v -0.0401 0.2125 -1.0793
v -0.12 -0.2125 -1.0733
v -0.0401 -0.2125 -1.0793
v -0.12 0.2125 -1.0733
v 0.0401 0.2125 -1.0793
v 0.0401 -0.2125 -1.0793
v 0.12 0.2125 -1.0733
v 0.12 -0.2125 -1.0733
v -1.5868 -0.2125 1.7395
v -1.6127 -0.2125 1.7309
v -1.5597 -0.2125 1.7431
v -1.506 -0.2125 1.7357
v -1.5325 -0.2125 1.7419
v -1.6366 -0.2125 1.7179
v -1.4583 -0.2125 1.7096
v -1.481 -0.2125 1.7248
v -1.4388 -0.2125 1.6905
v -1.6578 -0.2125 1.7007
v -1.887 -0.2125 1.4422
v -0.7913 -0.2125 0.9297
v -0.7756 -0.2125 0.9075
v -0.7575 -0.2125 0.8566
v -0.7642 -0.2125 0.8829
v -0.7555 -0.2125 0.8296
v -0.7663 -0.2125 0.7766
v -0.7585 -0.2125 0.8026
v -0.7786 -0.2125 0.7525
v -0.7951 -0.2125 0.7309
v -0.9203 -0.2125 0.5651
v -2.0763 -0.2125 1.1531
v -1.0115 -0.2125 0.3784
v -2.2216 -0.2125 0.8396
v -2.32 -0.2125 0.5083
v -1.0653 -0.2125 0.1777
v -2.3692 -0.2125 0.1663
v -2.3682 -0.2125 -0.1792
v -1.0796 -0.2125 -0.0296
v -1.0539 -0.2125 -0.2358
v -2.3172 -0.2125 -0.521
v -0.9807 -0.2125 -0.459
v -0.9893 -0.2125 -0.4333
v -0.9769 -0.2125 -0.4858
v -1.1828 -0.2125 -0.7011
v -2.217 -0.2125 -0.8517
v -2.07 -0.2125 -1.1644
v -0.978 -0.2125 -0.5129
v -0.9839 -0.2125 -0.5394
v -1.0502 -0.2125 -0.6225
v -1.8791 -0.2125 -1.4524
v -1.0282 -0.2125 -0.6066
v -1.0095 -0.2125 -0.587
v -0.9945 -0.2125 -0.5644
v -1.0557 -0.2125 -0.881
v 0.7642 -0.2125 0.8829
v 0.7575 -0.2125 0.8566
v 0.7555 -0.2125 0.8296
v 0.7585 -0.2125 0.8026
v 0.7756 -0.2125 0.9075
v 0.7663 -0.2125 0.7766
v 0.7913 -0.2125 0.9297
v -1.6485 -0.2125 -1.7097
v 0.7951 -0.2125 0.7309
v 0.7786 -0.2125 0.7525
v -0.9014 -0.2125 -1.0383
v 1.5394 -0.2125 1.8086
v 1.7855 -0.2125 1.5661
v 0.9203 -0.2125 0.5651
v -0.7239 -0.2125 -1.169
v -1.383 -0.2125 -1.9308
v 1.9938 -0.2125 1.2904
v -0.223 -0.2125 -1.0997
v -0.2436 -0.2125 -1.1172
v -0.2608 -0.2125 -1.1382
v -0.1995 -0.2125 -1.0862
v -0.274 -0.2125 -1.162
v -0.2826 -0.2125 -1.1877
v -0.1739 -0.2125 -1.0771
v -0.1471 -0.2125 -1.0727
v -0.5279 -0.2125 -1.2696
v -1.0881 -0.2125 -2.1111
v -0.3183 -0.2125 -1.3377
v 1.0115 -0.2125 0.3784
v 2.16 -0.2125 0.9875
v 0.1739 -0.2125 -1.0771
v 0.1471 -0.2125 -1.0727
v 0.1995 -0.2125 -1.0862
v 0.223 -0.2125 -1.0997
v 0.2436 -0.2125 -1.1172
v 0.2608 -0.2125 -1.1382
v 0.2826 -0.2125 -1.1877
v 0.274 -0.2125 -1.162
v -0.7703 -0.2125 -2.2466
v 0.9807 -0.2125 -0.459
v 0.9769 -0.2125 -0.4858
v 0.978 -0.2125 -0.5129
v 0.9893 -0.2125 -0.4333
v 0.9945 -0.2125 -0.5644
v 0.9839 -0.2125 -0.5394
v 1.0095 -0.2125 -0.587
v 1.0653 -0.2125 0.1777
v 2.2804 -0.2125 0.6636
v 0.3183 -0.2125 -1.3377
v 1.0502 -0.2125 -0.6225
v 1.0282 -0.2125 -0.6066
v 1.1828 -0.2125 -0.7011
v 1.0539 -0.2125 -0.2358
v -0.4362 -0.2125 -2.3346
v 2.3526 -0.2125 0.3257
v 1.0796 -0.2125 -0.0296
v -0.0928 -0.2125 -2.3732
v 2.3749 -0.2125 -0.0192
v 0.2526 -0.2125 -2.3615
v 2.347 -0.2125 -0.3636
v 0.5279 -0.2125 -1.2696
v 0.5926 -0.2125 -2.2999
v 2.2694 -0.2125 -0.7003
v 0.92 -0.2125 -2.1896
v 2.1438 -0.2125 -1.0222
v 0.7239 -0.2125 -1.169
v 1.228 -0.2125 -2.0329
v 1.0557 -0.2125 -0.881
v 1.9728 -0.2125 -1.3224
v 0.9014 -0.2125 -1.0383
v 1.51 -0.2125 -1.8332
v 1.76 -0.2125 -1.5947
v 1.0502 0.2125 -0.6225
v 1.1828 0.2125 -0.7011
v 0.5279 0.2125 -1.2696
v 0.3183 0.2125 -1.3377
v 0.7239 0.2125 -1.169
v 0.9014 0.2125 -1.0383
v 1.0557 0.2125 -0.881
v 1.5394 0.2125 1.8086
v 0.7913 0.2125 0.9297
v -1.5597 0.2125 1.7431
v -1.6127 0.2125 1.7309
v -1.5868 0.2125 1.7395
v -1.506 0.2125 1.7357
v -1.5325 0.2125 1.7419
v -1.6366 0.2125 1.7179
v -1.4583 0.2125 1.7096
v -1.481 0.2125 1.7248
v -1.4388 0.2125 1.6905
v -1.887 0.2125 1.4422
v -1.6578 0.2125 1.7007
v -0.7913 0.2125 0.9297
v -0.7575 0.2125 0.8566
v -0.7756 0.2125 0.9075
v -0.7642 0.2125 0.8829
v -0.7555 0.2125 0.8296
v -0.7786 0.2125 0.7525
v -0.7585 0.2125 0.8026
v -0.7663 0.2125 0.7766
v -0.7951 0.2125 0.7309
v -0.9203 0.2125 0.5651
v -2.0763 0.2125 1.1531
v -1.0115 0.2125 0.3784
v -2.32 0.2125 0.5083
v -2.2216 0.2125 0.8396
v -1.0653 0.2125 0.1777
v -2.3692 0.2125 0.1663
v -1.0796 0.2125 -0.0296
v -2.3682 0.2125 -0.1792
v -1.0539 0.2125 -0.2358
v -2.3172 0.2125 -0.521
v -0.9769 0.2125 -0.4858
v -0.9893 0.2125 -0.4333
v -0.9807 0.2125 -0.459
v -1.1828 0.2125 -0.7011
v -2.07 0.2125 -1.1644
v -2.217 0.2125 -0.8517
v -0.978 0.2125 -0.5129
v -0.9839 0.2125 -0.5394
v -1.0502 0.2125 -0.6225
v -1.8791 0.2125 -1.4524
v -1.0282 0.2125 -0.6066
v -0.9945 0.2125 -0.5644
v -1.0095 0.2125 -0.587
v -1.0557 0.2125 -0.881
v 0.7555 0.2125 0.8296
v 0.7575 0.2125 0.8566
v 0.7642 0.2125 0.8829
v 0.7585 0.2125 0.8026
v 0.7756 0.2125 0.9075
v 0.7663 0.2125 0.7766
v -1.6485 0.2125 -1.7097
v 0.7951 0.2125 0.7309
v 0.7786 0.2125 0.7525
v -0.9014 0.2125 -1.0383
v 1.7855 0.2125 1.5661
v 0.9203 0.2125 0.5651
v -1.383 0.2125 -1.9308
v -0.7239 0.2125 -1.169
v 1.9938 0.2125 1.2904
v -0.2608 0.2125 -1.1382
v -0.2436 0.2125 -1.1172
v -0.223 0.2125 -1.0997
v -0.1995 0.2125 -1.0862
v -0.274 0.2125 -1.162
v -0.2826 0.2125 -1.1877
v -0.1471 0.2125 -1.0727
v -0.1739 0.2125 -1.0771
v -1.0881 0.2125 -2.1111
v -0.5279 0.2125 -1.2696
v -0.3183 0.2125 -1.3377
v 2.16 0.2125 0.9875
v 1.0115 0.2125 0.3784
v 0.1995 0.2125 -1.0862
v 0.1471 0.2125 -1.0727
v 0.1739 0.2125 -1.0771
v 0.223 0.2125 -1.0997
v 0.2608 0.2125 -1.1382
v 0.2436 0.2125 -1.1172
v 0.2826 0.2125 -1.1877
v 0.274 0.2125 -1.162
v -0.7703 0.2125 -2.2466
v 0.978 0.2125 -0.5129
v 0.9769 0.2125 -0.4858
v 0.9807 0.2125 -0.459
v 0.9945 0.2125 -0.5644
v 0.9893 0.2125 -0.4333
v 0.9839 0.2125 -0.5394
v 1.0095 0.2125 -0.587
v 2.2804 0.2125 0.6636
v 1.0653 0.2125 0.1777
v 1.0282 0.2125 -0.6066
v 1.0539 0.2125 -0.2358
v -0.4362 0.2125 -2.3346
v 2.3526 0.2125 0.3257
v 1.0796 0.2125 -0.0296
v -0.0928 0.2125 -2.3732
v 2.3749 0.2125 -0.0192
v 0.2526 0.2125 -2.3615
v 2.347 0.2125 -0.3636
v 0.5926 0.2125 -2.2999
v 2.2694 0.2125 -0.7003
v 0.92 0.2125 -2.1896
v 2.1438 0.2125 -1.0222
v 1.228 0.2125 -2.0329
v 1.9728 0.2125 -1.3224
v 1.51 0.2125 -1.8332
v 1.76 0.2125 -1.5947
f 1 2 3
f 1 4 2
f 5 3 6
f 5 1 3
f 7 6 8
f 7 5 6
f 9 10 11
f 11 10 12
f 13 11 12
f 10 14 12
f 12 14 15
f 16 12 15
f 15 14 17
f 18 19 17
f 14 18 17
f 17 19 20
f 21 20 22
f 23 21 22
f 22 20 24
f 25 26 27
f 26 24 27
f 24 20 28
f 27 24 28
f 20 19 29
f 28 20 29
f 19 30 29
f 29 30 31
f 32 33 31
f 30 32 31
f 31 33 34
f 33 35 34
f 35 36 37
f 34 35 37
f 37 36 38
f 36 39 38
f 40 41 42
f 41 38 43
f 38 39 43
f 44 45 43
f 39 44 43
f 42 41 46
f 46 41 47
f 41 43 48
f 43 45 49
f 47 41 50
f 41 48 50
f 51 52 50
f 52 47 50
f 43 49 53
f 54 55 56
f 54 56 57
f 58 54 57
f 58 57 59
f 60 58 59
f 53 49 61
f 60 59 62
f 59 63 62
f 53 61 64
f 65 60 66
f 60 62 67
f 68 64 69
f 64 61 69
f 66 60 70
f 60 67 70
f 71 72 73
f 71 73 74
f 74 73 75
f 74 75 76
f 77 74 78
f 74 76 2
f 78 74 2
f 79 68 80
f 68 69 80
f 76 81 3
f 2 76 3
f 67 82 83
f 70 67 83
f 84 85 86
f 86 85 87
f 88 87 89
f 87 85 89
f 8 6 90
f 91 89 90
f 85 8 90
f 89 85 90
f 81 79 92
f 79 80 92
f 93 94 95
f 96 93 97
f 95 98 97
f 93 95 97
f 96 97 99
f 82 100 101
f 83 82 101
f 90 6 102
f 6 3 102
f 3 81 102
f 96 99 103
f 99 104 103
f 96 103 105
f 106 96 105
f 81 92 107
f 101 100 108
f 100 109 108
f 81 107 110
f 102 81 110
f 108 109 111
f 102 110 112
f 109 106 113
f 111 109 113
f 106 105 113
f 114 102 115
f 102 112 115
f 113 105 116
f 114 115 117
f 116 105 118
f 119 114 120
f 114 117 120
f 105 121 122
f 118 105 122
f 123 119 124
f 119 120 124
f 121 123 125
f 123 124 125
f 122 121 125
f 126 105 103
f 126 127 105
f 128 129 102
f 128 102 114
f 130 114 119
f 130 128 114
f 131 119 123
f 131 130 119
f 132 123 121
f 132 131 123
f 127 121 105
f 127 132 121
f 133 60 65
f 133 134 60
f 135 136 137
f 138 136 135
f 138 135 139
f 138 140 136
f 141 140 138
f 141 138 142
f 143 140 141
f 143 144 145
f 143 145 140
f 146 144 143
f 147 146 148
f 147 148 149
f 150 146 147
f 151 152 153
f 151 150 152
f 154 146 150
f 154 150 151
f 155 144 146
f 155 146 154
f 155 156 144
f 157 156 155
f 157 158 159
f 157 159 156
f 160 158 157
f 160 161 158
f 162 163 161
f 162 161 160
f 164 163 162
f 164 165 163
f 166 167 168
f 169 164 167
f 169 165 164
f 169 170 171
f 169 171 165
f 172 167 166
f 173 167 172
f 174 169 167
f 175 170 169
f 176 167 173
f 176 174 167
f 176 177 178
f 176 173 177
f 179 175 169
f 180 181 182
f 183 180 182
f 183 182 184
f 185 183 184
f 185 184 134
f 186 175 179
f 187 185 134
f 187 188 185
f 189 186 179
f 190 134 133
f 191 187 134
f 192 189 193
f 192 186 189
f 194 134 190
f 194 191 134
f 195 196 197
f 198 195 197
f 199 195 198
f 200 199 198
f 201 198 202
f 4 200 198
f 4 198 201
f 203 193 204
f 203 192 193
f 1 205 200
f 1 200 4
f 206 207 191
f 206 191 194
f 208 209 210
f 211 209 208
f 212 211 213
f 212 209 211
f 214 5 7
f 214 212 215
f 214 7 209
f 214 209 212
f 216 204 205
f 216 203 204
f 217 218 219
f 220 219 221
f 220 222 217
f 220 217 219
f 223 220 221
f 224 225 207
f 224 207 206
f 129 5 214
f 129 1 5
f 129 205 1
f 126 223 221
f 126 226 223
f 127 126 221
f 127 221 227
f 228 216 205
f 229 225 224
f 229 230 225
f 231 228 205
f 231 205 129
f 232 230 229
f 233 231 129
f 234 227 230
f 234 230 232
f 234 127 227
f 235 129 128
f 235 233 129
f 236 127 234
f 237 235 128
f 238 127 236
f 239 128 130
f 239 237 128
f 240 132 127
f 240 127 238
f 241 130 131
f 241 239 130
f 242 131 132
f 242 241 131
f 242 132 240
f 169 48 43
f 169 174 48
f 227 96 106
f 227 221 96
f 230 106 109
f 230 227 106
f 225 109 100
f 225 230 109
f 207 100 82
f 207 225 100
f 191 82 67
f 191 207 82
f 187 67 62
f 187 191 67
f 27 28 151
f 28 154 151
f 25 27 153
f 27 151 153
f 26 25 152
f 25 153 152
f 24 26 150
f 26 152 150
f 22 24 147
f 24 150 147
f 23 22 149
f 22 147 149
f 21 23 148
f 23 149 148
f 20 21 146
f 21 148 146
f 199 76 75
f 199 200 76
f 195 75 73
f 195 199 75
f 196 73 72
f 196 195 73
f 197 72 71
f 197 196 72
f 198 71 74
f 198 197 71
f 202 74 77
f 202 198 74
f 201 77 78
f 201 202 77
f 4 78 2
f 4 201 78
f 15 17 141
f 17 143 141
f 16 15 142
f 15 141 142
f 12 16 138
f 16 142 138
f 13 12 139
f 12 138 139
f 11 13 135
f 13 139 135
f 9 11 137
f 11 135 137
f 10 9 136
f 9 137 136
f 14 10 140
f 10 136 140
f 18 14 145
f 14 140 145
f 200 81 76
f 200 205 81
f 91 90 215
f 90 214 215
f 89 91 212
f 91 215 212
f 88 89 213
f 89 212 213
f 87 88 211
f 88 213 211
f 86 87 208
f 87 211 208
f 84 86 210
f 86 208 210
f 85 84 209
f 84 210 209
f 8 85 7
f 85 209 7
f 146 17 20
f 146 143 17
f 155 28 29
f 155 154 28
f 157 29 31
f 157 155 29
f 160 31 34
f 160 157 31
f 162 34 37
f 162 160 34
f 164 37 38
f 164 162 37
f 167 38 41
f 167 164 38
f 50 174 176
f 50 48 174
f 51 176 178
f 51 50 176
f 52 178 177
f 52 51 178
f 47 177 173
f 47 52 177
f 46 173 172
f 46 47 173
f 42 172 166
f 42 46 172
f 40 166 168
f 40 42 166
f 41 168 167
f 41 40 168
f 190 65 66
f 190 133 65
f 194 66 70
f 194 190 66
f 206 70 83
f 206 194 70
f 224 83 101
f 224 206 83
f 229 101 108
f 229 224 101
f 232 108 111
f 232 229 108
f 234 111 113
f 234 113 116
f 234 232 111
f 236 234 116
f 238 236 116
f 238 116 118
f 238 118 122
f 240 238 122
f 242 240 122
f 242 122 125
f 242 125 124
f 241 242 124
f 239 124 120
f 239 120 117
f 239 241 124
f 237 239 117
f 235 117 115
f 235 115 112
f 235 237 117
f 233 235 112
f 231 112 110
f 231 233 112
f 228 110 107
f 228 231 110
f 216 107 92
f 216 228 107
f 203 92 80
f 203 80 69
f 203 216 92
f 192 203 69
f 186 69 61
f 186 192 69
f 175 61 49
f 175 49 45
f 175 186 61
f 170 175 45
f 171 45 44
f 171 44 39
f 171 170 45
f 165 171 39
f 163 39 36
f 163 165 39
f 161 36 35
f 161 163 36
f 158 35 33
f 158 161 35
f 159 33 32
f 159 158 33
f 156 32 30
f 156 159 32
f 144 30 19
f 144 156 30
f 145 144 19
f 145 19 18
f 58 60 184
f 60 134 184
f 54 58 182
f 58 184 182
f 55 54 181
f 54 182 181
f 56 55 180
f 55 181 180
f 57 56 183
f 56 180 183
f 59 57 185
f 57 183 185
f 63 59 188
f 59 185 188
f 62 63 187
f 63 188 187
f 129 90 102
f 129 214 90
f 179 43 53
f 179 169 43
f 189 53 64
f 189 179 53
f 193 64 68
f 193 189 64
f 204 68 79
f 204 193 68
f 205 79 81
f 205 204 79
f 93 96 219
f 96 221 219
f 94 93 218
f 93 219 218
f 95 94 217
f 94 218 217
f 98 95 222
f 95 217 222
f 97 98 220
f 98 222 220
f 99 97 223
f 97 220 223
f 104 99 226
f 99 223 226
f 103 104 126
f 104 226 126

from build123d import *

# Parameters (mm, degrees)
BOSS_EXTRUDE1_DEPTH = 0.2125
FILLET1_R           = 0.15


with BuildPart() as part:
    # Sketch1 → Boss-Extrude1 (new, symmetric)
    with BuildSketch(Plane(origin=(0, 0, 0), x_dir=(1, 0, 0), z_dir=(0, 1, 0))):
        with BuildLine():
            Line((-0.318287037, 1.337654052), (-0.25, 1.050666455))
            ThreePointArc((-0.25, 1.050666455), (0, 1.08), (0.25, 1.050666455))
            Line((0.25, 1.050666455), (0.318287037, 1.337654052))
            ThreePointArc((0.318287037, 1.337654052), (0.815262336, 1.107236345), (1.182840592, 0.701079978))
            Line((1.182840592, 0.701079978), (0.929067519, 0.550666455))
            ThreePointArc((0.929067519, 0.550666455), (1.065278098, -0.177714864), (0.7, -0.822435408))
            Line((0.7, -0.822435408), (1.539351852, -1.808596383))
            ThreePointArc((1.539351852, -1.808596383), (0, 2.375), (-1.539351852, -1.808596383))
            Line((-1.539351852, -1.808596383), (-0.7, -0.822435408))
            ThreePointArc((-0.7, -0.822435408), (-1.065278098, -0.177714864), (-0.929067519, 0.550666455))
            Line((-0.929067519, 0.550666455), (-1.182840592, 0.701079978))
            ThreePointArc((-1.182840592, 0.701079978), (-0.815262336, 1.107236345), (-0.318287037, 1.337654052))
        make_face()
    extrude(amount=BOSS_EXTRUDE1_DEPTH, both=True)

    # Fillet1
    fillet1_edges = [part.edges().sort_by_distance(p)[0] for p in [
        (-0.929067519, 0, -0.550666455),
        (-0.7, 0, 0.822435408),
        (-1.539351852, 0, 1.808596383),
        (0.7, 0, 0.822435408),
        (0.929067519, 0, -0.550666455),
        (0.25, 0, -1.050666455),
        (-0.25, 0, -1.050666455),
    ]]
    fillet(fillet1_edges, radius=FILLET1_R)


solid = part.part
